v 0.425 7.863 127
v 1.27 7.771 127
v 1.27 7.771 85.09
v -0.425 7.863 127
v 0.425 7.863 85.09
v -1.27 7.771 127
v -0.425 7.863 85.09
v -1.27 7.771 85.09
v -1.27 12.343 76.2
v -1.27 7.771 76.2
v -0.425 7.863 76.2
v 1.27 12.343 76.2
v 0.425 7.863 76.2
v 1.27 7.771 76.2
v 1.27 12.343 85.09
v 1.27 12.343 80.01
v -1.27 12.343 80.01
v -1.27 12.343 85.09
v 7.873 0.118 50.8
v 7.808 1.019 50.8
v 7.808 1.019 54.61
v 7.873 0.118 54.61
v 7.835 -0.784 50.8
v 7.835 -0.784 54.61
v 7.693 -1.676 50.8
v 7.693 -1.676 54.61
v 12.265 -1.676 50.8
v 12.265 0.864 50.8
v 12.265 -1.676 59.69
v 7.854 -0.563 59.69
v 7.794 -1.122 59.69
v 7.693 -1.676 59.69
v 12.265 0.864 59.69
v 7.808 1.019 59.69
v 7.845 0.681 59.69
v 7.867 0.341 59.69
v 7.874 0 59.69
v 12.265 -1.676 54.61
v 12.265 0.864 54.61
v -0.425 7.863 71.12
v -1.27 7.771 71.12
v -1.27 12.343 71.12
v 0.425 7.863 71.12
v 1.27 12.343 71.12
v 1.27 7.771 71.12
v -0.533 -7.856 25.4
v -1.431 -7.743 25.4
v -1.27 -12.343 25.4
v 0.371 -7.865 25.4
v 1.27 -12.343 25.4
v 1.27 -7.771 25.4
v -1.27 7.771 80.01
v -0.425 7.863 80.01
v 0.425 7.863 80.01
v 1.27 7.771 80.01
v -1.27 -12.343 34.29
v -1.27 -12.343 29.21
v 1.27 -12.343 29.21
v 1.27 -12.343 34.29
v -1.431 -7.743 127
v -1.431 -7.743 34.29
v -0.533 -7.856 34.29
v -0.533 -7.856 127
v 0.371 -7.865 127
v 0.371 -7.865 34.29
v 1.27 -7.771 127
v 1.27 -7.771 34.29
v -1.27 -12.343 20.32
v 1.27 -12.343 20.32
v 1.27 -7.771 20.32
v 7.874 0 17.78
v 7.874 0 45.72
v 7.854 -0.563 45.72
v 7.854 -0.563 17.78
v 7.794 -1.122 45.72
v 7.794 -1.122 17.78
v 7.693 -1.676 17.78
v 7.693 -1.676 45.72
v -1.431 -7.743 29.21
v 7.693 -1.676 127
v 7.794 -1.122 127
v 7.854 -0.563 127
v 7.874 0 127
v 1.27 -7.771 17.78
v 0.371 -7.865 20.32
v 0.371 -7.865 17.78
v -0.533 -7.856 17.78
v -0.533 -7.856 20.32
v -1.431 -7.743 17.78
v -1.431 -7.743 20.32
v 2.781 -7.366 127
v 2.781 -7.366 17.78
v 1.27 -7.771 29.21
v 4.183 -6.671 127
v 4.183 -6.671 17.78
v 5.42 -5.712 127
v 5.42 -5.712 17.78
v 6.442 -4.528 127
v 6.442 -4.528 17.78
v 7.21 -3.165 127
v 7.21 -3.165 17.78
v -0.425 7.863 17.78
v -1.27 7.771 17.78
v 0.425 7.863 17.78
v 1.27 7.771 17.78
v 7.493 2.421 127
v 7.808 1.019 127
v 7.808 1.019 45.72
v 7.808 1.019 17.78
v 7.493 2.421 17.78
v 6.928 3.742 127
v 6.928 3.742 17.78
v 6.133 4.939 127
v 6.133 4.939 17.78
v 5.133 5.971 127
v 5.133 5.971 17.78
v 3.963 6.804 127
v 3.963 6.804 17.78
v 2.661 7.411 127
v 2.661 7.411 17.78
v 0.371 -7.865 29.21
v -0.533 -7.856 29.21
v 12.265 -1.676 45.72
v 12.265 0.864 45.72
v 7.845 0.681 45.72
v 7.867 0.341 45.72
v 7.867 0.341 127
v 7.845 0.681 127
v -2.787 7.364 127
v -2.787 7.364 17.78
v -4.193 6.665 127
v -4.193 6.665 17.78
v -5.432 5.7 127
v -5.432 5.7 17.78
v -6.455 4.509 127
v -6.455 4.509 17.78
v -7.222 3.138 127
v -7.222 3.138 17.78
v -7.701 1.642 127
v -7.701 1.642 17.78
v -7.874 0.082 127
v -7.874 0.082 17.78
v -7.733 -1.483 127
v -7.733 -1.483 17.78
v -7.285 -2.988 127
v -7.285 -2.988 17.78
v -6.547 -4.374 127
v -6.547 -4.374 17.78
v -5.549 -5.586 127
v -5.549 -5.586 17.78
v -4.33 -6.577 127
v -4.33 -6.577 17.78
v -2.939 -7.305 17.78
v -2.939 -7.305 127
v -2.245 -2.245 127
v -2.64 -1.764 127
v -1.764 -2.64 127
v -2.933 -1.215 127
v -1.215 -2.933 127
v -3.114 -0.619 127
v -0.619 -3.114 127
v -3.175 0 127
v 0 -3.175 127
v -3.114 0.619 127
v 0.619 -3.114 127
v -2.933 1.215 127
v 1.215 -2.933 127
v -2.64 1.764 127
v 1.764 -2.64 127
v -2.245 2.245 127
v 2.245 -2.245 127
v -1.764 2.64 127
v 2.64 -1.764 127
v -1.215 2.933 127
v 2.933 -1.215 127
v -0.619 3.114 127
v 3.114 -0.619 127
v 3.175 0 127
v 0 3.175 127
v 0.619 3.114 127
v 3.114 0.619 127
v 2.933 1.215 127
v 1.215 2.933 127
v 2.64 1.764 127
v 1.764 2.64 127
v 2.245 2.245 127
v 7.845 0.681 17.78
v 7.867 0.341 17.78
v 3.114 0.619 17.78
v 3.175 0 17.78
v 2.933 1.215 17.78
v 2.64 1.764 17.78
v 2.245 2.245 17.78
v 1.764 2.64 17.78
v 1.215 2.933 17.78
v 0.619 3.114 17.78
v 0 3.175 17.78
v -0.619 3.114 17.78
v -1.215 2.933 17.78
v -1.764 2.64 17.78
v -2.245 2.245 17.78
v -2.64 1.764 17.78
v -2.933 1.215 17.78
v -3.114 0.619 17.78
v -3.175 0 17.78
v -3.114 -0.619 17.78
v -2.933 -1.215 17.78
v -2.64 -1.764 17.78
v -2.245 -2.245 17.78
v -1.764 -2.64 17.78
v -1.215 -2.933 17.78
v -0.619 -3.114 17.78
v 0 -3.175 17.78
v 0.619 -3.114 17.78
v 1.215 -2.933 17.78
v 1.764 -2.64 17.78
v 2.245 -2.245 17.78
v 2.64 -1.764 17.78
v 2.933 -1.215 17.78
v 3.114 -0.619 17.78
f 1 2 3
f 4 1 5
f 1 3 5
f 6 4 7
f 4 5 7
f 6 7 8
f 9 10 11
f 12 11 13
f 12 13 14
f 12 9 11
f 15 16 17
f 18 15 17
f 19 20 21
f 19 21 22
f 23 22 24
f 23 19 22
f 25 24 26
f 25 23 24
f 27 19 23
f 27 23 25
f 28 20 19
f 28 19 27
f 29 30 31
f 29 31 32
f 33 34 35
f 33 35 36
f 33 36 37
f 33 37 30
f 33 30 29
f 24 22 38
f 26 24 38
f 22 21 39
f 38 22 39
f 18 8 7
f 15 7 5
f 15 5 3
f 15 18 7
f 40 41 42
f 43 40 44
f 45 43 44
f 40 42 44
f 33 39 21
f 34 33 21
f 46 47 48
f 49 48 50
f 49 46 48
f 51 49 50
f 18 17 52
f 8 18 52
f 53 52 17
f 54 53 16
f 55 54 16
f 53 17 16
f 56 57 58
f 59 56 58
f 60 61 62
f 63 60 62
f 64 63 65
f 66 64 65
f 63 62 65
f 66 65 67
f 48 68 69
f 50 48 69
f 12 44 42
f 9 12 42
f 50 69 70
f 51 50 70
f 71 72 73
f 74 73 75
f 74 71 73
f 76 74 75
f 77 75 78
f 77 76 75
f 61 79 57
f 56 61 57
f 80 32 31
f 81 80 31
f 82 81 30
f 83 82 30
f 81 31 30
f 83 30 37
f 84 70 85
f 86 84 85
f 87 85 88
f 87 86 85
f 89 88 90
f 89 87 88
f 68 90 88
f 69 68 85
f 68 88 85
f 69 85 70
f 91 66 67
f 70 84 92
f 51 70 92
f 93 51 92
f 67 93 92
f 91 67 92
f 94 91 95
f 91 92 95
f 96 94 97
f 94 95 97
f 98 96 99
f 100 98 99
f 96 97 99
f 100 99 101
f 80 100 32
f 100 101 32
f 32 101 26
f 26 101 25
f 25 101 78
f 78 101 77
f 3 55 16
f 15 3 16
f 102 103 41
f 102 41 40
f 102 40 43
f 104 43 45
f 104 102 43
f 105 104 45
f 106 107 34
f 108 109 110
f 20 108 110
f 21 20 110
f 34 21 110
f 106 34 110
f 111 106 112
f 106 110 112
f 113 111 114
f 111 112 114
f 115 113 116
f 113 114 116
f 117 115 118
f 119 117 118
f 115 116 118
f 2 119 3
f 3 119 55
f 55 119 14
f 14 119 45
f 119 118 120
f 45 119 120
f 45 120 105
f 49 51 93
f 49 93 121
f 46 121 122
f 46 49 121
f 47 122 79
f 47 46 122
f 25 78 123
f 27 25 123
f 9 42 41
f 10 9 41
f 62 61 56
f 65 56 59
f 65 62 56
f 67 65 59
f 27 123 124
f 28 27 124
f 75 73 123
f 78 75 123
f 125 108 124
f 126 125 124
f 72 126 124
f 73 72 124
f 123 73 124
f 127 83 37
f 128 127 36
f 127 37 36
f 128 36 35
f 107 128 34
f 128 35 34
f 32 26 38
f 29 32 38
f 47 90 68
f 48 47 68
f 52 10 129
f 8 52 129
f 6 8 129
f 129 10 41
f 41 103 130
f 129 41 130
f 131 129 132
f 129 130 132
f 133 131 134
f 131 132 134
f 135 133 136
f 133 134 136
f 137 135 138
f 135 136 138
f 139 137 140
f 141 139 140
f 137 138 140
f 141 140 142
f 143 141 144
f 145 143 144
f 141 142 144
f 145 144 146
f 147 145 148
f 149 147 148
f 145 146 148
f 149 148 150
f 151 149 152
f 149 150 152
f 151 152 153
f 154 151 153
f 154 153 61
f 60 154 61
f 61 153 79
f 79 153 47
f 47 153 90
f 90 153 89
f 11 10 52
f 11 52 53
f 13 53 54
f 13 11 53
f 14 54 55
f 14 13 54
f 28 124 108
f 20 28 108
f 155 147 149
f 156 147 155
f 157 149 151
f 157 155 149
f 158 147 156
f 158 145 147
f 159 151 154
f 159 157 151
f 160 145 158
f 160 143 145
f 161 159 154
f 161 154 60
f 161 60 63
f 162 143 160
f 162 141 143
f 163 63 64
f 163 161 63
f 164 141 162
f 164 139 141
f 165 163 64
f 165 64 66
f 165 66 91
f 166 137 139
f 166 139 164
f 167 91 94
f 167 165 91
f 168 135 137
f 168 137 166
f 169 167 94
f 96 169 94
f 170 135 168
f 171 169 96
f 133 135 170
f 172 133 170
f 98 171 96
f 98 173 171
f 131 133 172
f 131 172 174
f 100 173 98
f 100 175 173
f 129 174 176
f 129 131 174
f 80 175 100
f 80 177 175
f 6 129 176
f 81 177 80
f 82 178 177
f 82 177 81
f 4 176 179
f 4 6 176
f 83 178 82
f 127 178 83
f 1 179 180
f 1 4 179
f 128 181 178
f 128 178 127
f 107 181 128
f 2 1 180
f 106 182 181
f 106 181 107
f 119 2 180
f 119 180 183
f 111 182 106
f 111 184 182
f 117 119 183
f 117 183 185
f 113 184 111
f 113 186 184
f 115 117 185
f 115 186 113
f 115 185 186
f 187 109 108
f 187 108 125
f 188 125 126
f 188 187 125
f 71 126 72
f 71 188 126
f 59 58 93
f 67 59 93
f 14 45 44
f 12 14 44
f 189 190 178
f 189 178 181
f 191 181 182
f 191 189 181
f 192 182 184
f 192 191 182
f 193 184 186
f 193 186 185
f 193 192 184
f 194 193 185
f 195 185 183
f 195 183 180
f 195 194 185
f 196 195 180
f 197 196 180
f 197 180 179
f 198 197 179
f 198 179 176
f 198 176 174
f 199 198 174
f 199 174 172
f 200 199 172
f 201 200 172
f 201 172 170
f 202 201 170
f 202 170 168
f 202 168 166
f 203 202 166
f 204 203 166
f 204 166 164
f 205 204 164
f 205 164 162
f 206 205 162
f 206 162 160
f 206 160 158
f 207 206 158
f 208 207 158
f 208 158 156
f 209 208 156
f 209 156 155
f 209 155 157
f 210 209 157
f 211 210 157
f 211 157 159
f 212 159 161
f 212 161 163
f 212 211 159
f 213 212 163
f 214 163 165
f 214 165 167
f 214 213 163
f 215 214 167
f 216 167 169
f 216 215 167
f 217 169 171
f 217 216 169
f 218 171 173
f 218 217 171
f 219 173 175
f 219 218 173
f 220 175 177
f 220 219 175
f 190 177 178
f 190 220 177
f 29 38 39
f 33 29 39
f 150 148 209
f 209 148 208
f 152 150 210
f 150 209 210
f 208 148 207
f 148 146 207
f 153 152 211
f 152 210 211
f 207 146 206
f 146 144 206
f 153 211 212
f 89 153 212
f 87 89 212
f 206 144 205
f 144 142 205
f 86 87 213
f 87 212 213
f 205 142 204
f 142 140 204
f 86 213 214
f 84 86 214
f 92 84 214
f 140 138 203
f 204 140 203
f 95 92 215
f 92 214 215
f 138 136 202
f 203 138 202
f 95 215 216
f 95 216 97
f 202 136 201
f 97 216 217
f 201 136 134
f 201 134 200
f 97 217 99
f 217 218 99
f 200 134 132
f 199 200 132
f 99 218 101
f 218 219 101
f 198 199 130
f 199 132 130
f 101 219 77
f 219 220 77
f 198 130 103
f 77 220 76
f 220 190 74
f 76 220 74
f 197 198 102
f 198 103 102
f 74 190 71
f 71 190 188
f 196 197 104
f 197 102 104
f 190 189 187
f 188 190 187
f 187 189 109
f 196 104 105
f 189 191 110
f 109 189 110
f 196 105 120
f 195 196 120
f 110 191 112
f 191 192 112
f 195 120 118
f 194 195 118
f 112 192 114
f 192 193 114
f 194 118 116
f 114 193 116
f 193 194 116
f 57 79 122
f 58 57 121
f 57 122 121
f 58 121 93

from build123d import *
from build123d import SkipClean  # not in build123d's __all__

# Parameters (mm, degrees)
F0_R      = 3.175
F1_DEPTH  = 127
F2_DEPTH  = 76.2
F3_DEPTH  = 71.12
F4_DEPTH  = 50.8
F5_DEPTH  = 45.72
F6_DEPTH  = 25.4
F7_DEPTH  = 20.32
F9_DEPTH  = 8.89
F10_DEPTH = 3.81
F12_DEPTH = 8.89
F13_DEPTH = 3.81
F15_DEPTH = 8.89
F16_DEPTH = 3.81
F17_DEPTH = 17.78


# Not quite as in the source:
# - after a boolean that leaves OpenCascade's solid faulty, fix() repairs it


with BuildPart() as f1:
    # F0 (on Top) → F1 (new body)
    with BuildSketch(Plane.XY):
        with BuildLine():
            ThreePointArc((7.6934750952, -1.6764), (7.8287386883, -0.8430459954), (7.874, 0))
            ThreePointArc((7.874, 0), (7.8574202107, 0.5107089515), (7.8077506647, 1.0192671673))
            ThreePointArc((7.8077506647, 1.0192671673), (5.6566372636, 5.4774383491), (1.27, 7.7709057387))
            ThreePointArc((1.27, 7.7709057387), (0, 7.874), (-1.27, 7.7709057387))
            ThreePointArc((-1.27, 7.7709057387), (-7.8735779463, 0.0815249862), (-1.430634249, -7.7429426994))
            ThreePointArc((-1.430634249, -7.7429426994), (-0.0815249862, -7.8735779463), (1.27, -7.7709057387))
            ThreePointArc((1.27, -7.7709057387), (5.4195683864, -5.7121059606), (7.6934750952, -1.6764))
        make_face()
        Circle(F0_R, mode=Mode.SUBTRACT)
    extrude(amount=F1_DEPTH)

    # F0 (on Top) → F2 (join)
    with BuildSketch(Plane.XY):
        with BuildLine():
            ThreePointArc((-1.27, 7.7709057387), (0, 7.874), (1.27, 7.7709057387))
            Line((1.27, 7.7709057387), (1.27, 12.3429057387))
            Line((1.27, 12.3429057387), (-1.27, 12.3429057387))
            Line((-1.27, 12.3429057387), (-1.27, 7.7709057387))
        make_face()
    extrude(amount=F2_DEPTH)

    # F0 (on Top) → F3 (cut)
    with BuildSketch(Plane.XY):
        with BuildLine():
            ThreePointArc((-1.27, 7.7709057387), (0, 7.874), (1.27, 7.7709057387))
            Line((1.27, 7.7709057387), (1.27, 12.3429057387))
            Line((1.27, 12.3429057387), (-1.27, 12.3429057387))
            Line((-1.27, 12.3429057387), (-1.27, 7.7709057387))
        make_face()
    with SkipClean():  # cleaning this boolean's faces spoils the solid; the shape is the same uncleaned
        extrude(amount=F3_DEPTH, mode=Mode.SUBTRACT)

    # F0 (on Top) → F4 (join)
    with BuildSketch(Plane.XY):
        with BuildLine():
            ThreePointArc((7.8077506647, 1.0192671673), (7.8574202107, 0.5107089515), (7.874, 0))
            ThreePointArc((7.874, 0), (7.8287386883, -0.8430459954), (7.6934750952, -1.6764))
            Line((7.6934750952, -1.6764), (12.2654750952, -1.6764))
            Line((12.2654750952, -1.6764), (12.2654750952, 0.8636))
            Line((12.2654750952, 0.8636), (7.8077506647, 1.0192671673))
        make_face()
    extrude(amount=F4_DEPTH)

    add(f1.part.fix(), mode=Mode.REPLACE)

    # F0 (on Top) → F5 (cut)
    with BuildSketch(Plane.XY):
        with BuildLine():
            ThreePointArc((7.8077506647, 1.0192671673), (7.8574202107, 0.5107089515), (7.874, 0))
            ThreePointArc((7.874, 0), (7.8287386883, -0.8430459954), (7.6934750952, -1.6764))
            Line((7.6934750952, -1.6764), (12.2654750952, -1.6764))
            Line((12.2654750952, -1.6764), (12.2654750952, 0.8636))
            Line((12.2654750952, 0.8636), (7.8077506647, 1.0192671673))
        make_face()
    with SkipClean():  # cleaning this boolean's faces spoils the solid; the shape is the same uncleaned
        extrude(amount=F5_DEPTH, mode=Mode.SUBTRACT)

    # F0 (on Top) → F6 (join)
    with BuildSketch(Plane.XY):
        with BuildLine():
            Line((1.27, -12.3429057387), (1.27, -7.7709057387))
            ThreePointArc((1.27, -7.7709057387), (-0.0815249862, -7.8735779463), (-1.430634249, -7.7429426994))
            Line((-1.430634249, -7.7429426994), (-1.27, -12.3429057387))
            Line((-1.27, -12.3429057387), (1.27, -12.3429057387))
        make_face()
    extrude(amount=F6_DEPTH)

    add(f1.part.fix(), mode=Mode.REPLACE)

    # F0 (on Top) → F7 (cut)
    with BuildSketch(Plane.XY):
        with BuildLine():
            Line((1.27, -12.3429057387), (1.27, -7.7709057387))
            ThreePointArc((1.27, -7.7709057387), (-0.0815249862, -7.8735779463), (-1.430634249, -7.7429426994))
            Line((-1.430634249, -7.7429426994), (-1.27, -12.3429057387))
            Line((-1.27, -12.3429057387), (1.27, -12.3429057387))
        make_face()
    with SkipClean():  # cleaning this boolean's faces spoils the solid; the shape is the same uncleaned
        extrude(amount=F7_DEPTH, mode=Mode.SUBTRACT)

    # F8 (on face) → F9 (join)
    with BuildSketch(Plane.XY.offset(76.2)):
        with BuildLine():
            Line((1.27, 12.3429057387), (-1.27, 12.3429057387))
            Line((-1.27, 12.3429057387), (-1.27, 7.7709057387))
            ThreePointArc((-1.27, 7.7709057387), (0, 7.874), (1.27, 7.7709057387))
            Line((1.27, 7.7709057387), (1.27, 12.3429057387))
        make_face()
    extrude(amount=F9_DEPTH)

    # F8 (on face) → F10 (cut)
    with BuildSketch(Plane.XY.offset(76.2)):
        with BuildLine():
            Line((1.27, 12.3429057387), (-1.27, 12.3429057387))
            Line((-1.27, 12.3429057387), (-1.27, 7.7709057387))
            ThreePointArc((-1.27, 7.7709057387), (0, 7.874), (1.27, 7.7709057387))
            Line((1.27, 7.7709057387), (1.27, 12.3429057387))
        make_face()
    with SkipClean():  # cleaning this boolean's faces spoils the solid; the shape is the same uncleaned
        extrude(amount=F10_DEPTH, mode=Mode.SUBTRACT)

    # F11 (on face) → F12 (join)
    with BuildSketch(Plane.XY.offset(50.8)):
        with BuildLine():
            Line((12.2654750952, 0.8636), (7.8077506647, 1.0192671673))
            ThreePointArc((7.8077506647, 1.0192671673), (7.8669343066, -0.3334975508), (7.6934750952, -1.6764))
            Line((7.6934750952, -1.6764), (12.2654750952, -1.6764))
            Line((12.2654750952, -1.6764), (12.2654750952, 0.8636))
        make_face()
    extrude(amount=F12_DEPTH)

    # F11 (on face) → F13 (cut)
    with BuildSketch(Plane.XY.offset(50.8)):
        with BuildLine():
            Line((12.2654750952, 0.8636), (7.8077506647, 1.0192671673))
            ThreePointArc((7.8077506647, 1.0192671673), (7.8669343066, -0.3334975508), (7.6934750952, -1.6764))
            Line((7.6934750952, -1.6764), (12.2654750952, -1.6764))
            Line((12.2654750952, -1.6764), (12.2654750952, 0.8636))
        make_face()
    with SkipClean():  # cleaning this boolean's faces spoils the solid; the shape is the same uncleaned
        extrude(amount=F13_DEPTH, mode=Mode.SUBTRACT)

    # F14 (on face) → F15 (join)
    with BuildSketch(Plane.XY.offset(25.4)):
        with BuildLine():
            ThreePointArc((1.27, -7.7709057387), (-0.0815249862, -7.8735779463), (-1.430634249, -7.7429426994))
            Line((-1.430634249, -7.7429426994), (-1.27, -12.3429057387))
            Line((-1.27, -12.3429057387), (1.27, -12.3429057387))
            Line((1.27, -12.3429057387), (1.27, -7.7709057387))
        make_face()
    extrude(amount=F15_DEPTH)

    # F14 (on face) → F16 (cut)
    with BuildSketch(Plane.XY.offset(25.4)):
        with BuildLine():
            ThreePointArc((1.27, -7.7709057387), (-0.0815249862, -7.8735779463), (-1.430634249, -7.7429426994))
            Line((-1.430634249, -7.7429426994), (-1.27, -12.3429057387))
            Line((-1.27, -12.3429057387), (1.27, -12.3429057387))
            Line((1.27, -12.3429057387), (1.27, -7.7709057387))
        make_face()
    extrude(amount=F16_DEPTH, mode=Mode.SUBTRACT)

    # F0 (on Top) → F17 (cut)
    with BuildSketch(Plane.XY):
        with BuildLine():
            ThreePointArc((7.6934750952, -1.6764), (7.8287386883, -0.8430459954), (7.874, 0))
            ThreePointArc((7.874, 0), (7.8574202107, 0.5107089515), (7.8077506647, 1.0192671673))
            ThreePointArc((7.8077506647, 1.0192671673), (5.6566372636, 5.4774383491), (1.27, 7.7709057387))
            ThreePointArc((1.27, 7.7709057387), (0, 7.874), (-1.27, 7.7709057387))
            ThreePointArc((-1.27, 7.7709057387), (-7.8735779463, 0.0815249862), (-1.430634249, -7.7429426994))
            ThreePointArc((-1.430634249, -7.7429426994), (-0.0815249862, -7.8735779463), (1.27, -7.7709057387))
            ThreePointArc((1.27, -7.7709057387), (5.4195683864, -5.7121059606), (7.6934750952, -1.6764))
        make_face()
        Circle(F0_R, mode=Mode.SUBTRACT)
    extrude(amount=F17_DEPTH, mode=Mode.SUBTRACT)


solid = f1.part
